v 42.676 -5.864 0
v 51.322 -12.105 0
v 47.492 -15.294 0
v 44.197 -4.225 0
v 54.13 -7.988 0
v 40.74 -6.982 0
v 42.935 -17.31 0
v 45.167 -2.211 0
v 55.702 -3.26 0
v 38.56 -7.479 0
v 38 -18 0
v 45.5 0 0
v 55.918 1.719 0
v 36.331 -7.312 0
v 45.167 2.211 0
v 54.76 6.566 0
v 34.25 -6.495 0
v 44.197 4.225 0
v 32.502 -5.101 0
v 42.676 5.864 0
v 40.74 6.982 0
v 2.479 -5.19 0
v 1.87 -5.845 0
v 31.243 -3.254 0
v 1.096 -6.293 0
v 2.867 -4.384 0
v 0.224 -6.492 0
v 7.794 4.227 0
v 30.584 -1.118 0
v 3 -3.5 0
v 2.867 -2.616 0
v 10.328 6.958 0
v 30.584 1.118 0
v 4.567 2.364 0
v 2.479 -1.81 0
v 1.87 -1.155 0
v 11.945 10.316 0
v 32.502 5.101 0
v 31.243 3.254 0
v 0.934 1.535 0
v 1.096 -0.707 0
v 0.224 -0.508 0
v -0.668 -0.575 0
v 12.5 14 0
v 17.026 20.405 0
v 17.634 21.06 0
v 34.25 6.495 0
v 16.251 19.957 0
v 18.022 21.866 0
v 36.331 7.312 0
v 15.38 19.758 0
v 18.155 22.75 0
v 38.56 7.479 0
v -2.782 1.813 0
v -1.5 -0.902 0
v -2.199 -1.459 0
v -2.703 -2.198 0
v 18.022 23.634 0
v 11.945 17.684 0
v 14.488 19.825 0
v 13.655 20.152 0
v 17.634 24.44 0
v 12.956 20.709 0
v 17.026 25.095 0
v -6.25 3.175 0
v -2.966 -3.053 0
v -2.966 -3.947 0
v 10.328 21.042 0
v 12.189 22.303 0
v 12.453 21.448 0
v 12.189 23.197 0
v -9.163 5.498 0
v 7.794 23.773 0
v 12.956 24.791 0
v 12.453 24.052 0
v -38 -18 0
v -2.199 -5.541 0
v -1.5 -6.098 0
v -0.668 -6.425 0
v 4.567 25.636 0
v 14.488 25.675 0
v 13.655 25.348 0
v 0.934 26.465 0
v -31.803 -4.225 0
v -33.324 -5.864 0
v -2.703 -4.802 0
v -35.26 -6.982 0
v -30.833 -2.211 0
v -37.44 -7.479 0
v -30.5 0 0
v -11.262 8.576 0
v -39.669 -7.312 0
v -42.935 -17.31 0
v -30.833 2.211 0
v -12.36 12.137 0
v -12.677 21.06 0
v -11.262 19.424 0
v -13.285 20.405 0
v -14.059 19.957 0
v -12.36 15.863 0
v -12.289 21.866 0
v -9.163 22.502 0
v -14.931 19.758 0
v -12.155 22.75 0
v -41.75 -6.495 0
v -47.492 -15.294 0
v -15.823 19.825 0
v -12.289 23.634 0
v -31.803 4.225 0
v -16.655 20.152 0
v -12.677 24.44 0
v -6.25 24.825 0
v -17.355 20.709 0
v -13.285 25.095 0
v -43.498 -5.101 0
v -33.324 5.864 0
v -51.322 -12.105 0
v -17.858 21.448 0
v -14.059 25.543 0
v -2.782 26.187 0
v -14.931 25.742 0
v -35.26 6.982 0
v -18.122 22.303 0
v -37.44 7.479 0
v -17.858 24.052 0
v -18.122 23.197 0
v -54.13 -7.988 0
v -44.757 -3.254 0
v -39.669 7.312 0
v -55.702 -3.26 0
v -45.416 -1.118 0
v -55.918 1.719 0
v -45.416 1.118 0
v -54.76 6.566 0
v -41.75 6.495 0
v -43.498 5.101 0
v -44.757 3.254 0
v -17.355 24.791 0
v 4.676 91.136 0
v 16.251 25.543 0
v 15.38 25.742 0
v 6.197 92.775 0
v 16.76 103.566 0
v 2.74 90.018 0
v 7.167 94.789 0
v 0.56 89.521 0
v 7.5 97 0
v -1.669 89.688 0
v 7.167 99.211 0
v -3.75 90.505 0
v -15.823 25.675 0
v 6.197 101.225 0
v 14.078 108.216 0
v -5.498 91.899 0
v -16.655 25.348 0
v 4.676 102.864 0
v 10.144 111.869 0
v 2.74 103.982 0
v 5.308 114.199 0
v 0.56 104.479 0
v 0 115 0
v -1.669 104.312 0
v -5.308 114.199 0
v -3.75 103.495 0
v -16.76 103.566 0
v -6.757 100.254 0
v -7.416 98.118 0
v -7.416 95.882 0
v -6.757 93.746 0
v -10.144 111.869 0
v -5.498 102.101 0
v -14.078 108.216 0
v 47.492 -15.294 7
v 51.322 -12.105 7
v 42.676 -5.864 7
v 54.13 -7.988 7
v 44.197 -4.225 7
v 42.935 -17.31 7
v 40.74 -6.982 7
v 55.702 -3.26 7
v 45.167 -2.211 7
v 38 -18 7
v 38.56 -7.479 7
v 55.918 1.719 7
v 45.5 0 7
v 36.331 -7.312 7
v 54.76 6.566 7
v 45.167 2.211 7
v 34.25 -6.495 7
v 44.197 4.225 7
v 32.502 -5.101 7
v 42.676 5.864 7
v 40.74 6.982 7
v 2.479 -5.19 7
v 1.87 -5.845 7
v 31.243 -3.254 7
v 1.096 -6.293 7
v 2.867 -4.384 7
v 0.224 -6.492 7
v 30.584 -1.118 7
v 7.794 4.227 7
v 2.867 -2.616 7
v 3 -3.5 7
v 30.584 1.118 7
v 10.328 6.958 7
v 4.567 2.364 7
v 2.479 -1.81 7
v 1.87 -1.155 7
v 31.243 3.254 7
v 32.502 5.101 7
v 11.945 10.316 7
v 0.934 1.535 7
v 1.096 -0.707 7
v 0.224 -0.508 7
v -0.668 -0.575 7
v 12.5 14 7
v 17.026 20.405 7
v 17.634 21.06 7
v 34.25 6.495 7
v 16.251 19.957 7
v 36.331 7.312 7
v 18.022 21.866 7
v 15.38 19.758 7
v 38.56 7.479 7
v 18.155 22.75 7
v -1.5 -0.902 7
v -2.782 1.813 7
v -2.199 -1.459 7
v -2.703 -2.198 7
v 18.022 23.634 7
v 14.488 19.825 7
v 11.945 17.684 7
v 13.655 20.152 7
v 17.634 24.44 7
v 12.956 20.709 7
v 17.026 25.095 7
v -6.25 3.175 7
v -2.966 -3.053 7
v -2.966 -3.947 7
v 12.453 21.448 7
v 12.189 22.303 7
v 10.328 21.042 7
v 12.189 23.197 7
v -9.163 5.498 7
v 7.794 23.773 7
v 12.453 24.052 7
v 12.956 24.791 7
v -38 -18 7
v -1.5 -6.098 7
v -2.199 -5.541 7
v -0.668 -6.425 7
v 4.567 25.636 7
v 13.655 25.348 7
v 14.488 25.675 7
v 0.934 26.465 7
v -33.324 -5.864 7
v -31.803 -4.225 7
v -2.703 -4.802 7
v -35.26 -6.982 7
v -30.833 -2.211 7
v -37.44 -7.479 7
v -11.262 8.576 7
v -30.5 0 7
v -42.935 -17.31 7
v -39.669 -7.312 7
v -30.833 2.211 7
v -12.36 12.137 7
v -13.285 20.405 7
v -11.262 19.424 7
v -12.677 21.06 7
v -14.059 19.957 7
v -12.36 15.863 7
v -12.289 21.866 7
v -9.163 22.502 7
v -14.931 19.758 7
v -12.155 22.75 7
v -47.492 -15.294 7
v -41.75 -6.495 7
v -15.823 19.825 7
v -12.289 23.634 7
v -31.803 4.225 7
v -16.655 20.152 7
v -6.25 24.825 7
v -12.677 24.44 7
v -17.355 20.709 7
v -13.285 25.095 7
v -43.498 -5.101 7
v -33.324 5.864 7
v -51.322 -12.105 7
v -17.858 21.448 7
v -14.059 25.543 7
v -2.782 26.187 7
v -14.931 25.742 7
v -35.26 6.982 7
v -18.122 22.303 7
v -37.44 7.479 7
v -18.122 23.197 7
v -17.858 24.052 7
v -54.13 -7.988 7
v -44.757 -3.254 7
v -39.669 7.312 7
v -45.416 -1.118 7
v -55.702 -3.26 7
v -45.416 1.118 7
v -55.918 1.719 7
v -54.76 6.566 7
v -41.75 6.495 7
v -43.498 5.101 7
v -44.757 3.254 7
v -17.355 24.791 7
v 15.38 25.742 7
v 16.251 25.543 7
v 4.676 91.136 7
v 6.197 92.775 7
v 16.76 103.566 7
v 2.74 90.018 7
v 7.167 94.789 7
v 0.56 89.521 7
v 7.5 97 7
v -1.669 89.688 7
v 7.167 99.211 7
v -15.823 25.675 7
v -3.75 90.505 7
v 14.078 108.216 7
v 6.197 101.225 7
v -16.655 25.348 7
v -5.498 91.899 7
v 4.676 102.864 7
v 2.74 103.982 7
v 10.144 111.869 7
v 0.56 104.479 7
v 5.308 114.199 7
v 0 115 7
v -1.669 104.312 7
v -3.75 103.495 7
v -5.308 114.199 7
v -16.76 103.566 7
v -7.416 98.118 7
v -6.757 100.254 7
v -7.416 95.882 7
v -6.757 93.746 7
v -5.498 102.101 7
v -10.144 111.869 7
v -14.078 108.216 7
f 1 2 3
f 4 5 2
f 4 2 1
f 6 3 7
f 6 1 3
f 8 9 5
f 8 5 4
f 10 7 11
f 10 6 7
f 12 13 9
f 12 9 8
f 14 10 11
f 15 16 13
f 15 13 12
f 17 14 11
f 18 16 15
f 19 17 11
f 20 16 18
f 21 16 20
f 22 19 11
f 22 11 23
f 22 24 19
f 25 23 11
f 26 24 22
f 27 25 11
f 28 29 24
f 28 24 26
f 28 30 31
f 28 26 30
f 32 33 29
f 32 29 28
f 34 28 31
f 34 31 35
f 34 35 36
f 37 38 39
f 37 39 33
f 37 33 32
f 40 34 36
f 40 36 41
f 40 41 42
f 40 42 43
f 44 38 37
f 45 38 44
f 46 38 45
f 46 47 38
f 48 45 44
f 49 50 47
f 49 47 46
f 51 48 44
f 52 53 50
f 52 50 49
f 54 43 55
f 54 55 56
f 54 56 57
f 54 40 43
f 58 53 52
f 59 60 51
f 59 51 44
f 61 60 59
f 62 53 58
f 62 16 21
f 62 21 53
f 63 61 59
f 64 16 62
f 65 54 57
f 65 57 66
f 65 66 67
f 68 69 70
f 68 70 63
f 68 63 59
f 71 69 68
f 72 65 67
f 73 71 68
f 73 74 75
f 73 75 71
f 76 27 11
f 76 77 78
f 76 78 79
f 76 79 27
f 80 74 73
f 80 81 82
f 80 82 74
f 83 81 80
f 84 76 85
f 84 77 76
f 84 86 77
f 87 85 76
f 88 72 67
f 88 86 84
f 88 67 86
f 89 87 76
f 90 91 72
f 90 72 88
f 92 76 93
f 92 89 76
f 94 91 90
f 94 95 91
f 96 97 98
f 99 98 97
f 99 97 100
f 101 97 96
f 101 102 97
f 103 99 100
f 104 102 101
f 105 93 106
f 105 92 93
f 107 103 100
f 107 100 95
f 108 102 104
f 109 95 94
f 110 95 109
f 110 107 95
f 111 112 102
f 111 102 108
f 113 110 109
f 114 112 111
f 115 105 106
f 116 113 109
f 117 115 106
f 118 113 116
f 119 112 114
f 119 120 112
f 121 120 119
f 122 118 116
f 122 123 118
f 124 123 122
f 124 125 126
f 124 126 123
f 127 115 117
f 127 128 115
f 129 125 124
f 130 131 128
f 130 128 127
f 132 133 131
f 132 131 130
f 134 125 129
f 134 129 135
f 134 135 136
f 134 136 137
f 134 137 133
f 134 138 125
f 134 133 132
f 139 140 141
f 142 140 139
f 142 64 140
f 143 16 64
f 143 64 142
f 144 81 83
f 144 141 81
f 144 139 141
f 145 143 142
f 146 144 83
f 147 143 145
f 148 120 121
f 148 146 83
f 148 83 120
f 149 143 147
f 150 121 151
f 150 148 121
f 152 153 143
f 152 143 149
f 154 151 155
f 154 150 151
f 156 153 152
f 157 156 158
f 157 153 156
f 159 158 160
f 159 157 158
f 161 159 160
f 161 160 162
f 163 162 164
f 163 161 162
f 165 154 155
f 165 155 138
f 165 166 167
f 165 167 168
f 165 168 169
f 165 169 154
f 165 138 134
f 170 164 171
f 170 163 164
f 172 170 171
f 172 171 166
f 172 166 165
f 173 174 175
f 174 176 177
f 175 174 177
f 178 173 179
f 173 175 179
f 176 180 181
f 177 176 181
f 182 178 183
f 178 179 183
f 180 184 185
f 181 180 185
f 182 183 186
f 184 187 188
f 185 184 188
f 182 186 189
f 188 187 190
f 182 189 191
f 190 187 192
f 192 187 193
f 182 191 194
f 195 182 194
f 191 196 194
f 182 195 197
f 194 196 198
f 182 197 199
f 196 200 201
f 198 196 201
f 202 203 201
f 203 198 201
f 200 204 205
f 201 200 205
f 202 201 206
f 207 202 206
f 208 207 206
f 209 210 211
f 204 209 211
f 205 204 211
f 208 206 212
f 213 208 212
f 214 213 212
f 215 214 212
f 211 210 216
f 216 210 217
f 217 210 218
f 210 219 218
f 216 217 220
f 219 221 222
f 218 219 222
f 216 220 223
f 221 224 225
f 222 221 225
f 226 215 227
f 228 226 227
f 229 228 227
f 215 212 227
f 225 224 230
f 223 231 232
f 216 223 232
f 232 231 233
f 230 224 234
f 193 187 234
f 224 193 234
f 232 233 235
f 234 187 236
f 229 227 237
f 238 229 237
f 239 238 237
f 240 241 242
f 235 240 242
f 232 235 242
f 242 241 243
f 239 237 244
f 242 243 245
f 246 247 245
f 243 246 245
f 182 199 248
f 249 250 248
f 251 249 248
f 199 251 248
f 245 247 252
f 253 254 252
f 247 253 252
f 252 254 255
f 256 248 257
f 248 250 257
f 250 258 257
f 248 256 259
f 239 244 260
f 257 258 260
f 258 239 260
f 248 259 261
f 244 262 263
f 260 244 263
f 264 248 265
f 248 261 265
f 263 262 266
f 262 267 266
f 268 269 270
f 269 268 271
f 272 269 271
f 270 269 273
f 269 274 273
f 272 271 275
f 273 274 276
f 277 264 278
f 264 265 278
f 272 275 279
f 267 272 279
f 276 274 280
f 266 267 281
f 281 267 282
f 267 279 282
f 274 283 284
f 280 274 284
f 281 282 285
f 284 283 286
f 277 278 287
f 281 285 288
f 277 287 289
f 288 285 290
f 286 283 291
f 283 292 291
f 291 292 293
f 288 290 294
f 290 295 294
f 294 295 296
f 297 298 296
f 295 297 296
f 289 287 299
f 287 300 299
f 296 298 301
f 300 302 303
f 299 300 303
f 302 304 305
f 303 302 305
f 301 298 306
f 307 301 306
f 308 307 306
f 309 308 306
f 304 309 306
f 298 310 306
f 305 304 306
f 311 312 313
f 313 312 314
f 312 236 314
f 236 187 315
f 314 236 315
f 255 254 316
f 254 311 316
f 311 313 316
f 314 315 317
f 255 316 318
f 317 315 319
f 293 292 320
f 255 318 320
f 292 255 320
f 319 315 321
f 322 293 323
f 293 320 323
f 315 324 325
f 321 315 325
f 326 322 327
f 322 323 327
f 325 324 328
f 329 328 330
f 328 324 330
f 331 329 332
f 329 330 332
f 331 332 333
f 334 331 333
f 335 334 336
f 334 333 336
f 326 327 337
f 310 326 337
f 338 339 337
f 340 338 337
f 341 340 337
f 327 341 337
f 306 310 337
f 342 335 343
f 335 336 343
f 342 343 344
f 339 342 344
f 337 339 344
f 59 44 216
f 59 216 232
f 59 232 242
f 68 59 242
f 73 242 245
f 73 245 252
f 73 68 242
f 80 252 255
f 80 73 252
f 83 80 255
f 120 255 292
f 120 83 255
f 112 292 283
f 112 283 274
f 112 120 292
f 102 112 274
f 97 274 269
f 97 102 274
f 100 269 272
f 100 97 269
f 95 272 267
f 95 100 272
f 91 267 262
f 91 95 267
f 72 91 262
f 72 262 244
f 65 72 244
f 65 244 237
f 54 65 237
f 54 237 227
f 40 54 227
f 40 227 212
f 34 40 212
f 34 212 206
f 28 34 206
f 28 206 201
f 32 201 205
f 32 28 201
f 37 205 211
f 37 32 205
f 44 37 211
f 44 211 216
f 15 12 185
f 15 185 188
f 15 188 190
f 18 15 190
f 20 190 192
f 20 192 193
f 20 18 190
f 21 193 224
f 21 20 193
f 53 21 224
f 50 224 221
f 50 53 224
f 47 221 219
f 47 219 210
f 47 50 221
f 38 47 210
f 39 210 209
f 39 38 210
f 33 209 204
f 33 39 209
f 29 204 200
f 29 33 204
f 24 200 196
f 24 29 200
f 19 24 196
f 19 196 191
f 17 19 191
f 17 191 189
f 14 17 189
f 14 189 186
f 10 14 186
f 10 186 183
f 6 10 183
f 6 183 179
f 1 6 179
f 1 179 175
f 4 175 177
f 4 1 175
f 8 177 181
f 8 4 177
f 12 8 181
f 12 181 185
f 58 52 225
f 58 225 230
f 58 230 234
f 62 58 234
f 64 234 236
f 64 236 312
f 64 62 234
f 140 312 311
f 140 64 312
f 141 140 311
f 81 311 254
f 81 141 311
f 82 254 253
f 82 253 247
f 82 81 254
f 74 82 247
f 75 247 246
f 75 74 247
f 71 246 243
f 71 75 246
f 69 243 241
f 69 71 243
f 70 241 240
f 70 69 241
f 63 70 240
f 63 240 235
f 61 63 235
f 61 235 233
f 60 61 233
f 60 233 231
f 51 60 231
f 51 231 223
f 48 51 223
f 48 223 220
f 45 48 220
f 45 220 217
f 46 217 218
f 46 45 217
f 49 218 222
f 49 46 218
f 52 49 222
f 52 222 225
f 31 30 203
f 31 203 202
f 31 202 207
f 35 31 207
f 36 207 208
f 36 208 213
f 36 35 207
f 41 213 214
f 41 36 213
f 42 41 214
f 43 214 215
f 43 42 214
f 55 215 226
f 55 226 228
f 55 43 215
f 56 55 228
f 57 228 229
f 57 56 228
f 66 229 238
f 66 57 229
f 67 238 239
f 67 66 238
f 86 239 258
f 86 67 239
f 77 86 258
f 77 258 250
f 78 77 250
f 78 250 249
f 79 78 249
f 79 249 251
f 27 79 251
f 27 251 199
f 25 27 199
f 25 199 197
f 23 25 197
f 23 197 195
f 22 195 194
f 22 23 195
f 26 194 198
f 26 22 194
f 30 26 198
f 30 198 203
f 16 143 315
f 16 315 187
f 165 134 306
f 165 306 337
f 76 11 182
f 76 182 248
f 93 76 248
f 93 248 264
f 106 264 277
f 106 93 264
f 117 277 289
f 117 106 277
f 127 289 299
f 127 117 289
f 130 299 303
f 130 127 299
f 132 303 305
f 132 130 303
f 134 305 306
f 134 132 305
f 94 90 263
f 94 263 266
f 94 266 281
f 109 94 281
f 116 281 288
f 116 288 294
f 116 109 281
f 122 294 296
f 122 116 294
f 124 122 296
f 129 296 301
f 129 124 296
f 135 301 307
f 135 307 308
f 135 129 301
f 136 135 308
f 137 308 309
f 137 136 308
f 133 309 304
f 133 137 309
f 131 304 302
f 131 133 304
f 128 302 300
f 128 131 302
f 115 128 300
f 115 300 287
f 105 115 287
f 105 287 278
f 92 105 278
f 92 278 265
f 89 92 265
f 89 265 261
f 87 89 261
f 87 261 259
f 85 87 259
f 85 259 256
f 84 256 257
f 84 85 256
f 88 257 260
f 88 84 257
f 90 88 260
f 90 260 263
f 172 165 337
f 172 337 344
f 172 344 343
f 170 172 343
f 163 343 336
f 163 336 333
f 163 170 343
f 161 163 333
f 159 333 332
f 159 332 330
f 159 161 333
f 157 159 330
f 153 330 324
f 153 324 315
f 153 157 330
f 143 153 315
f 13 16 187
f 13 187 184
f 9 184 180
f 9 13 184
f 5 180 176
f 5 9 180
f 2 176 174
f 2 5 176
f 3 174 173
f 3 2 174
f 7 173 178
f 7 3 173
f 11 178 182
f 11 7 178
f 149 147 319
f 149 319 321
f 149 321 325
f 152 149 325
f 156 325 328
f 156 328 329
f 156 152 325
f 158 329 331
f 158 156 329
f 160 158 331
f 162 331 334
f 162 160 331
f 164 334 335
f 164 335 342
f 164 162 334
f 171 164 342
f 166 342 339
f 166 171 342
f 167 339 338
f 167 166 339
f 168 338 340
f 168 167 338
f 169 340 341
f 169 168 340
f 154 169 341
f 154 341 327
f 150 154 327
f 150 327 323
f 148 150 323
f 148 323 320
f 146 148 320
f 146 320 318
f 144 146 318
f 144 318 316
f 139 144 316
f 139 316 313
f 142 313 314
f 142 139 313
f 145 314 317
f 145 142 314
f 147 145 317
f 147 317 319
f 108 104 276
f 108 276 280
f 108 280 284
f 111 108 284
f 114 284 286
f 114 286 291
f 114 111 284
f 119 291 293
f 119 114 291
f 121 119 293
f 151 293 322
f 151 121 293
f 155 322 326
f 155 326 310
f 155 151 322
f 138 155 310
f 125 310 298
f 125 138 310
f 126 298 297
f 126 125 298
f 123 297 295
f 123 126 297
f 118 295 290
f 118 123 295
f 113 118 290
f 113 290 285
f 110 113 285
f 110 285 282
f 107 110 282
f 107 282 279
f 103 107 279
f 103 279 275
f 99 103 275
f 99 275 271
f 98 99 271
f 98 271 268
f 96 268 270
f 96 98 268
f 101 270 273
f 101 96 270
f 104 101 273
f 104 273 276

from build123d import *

# Parameters (mm, degrees)
SKETCH1_R           = 7.5
SKETCH1_R_2         = 12.5
SKETCH1_R_3         = 3
BOSS_EXTRUDE1_DEPTH = 7


with BuildPart() as part:
    # Sketch1 → Boss-Extrude1 (new body)
    with BuildSketch(Plane.XY):
        with BuildLine():
            Line((-54.759819531, 6.565702497), (-16.759819531, 103.565702497))
            ThreePointArc((-16.759819531, 103.565702497), (0, 115), (16.759819531, 103.565702497))
            Line((16.759819531, 103.565702497), (54.759819531, 6.565702497))
            ThreePointArc((54.759819531, 6.565702497), (52.869139937, -10.144391432), (38, -18))
            Line((38, -18), (-38, -18))
            ThreePointArc((-38, -18), (-52.869139937, -10.144391432), (-54.759819531, 6.565702497))
        make_face()
        with Locations((0, 97)):
            Circle(SKETCH1_R, mode=Mode.SUBTRACT)
        with Locations((-38, 0)):
            Circle(SKETCH1_R, mode=Mode.SUBTRACT)
        with Locations((38, 0)):
            Circle(SKETCH1_R, mode=Mode.SUBTRACT)
        with Locations((0, 14)):
            Circle(SKETCH1_R_2, mode=Mode.SUBTRACT)
        with Locations((0, -3.5)):
            Circle(SKETCH1_R_3, mode=Mode.SUBTRACT)
        with Locations((-15.155444566, 22.75)):
            Circle(SKETCH1_R_3, mode=Mode.SUBTRACT)
        with Locations((15.155444566, 22.75)):
            Circle(SKETCH1_R_3, mode=Mode.SUBTRACT)
    extrude(amount=BOSS_EXTRUDE1_DEPTH)


solid = part.part
